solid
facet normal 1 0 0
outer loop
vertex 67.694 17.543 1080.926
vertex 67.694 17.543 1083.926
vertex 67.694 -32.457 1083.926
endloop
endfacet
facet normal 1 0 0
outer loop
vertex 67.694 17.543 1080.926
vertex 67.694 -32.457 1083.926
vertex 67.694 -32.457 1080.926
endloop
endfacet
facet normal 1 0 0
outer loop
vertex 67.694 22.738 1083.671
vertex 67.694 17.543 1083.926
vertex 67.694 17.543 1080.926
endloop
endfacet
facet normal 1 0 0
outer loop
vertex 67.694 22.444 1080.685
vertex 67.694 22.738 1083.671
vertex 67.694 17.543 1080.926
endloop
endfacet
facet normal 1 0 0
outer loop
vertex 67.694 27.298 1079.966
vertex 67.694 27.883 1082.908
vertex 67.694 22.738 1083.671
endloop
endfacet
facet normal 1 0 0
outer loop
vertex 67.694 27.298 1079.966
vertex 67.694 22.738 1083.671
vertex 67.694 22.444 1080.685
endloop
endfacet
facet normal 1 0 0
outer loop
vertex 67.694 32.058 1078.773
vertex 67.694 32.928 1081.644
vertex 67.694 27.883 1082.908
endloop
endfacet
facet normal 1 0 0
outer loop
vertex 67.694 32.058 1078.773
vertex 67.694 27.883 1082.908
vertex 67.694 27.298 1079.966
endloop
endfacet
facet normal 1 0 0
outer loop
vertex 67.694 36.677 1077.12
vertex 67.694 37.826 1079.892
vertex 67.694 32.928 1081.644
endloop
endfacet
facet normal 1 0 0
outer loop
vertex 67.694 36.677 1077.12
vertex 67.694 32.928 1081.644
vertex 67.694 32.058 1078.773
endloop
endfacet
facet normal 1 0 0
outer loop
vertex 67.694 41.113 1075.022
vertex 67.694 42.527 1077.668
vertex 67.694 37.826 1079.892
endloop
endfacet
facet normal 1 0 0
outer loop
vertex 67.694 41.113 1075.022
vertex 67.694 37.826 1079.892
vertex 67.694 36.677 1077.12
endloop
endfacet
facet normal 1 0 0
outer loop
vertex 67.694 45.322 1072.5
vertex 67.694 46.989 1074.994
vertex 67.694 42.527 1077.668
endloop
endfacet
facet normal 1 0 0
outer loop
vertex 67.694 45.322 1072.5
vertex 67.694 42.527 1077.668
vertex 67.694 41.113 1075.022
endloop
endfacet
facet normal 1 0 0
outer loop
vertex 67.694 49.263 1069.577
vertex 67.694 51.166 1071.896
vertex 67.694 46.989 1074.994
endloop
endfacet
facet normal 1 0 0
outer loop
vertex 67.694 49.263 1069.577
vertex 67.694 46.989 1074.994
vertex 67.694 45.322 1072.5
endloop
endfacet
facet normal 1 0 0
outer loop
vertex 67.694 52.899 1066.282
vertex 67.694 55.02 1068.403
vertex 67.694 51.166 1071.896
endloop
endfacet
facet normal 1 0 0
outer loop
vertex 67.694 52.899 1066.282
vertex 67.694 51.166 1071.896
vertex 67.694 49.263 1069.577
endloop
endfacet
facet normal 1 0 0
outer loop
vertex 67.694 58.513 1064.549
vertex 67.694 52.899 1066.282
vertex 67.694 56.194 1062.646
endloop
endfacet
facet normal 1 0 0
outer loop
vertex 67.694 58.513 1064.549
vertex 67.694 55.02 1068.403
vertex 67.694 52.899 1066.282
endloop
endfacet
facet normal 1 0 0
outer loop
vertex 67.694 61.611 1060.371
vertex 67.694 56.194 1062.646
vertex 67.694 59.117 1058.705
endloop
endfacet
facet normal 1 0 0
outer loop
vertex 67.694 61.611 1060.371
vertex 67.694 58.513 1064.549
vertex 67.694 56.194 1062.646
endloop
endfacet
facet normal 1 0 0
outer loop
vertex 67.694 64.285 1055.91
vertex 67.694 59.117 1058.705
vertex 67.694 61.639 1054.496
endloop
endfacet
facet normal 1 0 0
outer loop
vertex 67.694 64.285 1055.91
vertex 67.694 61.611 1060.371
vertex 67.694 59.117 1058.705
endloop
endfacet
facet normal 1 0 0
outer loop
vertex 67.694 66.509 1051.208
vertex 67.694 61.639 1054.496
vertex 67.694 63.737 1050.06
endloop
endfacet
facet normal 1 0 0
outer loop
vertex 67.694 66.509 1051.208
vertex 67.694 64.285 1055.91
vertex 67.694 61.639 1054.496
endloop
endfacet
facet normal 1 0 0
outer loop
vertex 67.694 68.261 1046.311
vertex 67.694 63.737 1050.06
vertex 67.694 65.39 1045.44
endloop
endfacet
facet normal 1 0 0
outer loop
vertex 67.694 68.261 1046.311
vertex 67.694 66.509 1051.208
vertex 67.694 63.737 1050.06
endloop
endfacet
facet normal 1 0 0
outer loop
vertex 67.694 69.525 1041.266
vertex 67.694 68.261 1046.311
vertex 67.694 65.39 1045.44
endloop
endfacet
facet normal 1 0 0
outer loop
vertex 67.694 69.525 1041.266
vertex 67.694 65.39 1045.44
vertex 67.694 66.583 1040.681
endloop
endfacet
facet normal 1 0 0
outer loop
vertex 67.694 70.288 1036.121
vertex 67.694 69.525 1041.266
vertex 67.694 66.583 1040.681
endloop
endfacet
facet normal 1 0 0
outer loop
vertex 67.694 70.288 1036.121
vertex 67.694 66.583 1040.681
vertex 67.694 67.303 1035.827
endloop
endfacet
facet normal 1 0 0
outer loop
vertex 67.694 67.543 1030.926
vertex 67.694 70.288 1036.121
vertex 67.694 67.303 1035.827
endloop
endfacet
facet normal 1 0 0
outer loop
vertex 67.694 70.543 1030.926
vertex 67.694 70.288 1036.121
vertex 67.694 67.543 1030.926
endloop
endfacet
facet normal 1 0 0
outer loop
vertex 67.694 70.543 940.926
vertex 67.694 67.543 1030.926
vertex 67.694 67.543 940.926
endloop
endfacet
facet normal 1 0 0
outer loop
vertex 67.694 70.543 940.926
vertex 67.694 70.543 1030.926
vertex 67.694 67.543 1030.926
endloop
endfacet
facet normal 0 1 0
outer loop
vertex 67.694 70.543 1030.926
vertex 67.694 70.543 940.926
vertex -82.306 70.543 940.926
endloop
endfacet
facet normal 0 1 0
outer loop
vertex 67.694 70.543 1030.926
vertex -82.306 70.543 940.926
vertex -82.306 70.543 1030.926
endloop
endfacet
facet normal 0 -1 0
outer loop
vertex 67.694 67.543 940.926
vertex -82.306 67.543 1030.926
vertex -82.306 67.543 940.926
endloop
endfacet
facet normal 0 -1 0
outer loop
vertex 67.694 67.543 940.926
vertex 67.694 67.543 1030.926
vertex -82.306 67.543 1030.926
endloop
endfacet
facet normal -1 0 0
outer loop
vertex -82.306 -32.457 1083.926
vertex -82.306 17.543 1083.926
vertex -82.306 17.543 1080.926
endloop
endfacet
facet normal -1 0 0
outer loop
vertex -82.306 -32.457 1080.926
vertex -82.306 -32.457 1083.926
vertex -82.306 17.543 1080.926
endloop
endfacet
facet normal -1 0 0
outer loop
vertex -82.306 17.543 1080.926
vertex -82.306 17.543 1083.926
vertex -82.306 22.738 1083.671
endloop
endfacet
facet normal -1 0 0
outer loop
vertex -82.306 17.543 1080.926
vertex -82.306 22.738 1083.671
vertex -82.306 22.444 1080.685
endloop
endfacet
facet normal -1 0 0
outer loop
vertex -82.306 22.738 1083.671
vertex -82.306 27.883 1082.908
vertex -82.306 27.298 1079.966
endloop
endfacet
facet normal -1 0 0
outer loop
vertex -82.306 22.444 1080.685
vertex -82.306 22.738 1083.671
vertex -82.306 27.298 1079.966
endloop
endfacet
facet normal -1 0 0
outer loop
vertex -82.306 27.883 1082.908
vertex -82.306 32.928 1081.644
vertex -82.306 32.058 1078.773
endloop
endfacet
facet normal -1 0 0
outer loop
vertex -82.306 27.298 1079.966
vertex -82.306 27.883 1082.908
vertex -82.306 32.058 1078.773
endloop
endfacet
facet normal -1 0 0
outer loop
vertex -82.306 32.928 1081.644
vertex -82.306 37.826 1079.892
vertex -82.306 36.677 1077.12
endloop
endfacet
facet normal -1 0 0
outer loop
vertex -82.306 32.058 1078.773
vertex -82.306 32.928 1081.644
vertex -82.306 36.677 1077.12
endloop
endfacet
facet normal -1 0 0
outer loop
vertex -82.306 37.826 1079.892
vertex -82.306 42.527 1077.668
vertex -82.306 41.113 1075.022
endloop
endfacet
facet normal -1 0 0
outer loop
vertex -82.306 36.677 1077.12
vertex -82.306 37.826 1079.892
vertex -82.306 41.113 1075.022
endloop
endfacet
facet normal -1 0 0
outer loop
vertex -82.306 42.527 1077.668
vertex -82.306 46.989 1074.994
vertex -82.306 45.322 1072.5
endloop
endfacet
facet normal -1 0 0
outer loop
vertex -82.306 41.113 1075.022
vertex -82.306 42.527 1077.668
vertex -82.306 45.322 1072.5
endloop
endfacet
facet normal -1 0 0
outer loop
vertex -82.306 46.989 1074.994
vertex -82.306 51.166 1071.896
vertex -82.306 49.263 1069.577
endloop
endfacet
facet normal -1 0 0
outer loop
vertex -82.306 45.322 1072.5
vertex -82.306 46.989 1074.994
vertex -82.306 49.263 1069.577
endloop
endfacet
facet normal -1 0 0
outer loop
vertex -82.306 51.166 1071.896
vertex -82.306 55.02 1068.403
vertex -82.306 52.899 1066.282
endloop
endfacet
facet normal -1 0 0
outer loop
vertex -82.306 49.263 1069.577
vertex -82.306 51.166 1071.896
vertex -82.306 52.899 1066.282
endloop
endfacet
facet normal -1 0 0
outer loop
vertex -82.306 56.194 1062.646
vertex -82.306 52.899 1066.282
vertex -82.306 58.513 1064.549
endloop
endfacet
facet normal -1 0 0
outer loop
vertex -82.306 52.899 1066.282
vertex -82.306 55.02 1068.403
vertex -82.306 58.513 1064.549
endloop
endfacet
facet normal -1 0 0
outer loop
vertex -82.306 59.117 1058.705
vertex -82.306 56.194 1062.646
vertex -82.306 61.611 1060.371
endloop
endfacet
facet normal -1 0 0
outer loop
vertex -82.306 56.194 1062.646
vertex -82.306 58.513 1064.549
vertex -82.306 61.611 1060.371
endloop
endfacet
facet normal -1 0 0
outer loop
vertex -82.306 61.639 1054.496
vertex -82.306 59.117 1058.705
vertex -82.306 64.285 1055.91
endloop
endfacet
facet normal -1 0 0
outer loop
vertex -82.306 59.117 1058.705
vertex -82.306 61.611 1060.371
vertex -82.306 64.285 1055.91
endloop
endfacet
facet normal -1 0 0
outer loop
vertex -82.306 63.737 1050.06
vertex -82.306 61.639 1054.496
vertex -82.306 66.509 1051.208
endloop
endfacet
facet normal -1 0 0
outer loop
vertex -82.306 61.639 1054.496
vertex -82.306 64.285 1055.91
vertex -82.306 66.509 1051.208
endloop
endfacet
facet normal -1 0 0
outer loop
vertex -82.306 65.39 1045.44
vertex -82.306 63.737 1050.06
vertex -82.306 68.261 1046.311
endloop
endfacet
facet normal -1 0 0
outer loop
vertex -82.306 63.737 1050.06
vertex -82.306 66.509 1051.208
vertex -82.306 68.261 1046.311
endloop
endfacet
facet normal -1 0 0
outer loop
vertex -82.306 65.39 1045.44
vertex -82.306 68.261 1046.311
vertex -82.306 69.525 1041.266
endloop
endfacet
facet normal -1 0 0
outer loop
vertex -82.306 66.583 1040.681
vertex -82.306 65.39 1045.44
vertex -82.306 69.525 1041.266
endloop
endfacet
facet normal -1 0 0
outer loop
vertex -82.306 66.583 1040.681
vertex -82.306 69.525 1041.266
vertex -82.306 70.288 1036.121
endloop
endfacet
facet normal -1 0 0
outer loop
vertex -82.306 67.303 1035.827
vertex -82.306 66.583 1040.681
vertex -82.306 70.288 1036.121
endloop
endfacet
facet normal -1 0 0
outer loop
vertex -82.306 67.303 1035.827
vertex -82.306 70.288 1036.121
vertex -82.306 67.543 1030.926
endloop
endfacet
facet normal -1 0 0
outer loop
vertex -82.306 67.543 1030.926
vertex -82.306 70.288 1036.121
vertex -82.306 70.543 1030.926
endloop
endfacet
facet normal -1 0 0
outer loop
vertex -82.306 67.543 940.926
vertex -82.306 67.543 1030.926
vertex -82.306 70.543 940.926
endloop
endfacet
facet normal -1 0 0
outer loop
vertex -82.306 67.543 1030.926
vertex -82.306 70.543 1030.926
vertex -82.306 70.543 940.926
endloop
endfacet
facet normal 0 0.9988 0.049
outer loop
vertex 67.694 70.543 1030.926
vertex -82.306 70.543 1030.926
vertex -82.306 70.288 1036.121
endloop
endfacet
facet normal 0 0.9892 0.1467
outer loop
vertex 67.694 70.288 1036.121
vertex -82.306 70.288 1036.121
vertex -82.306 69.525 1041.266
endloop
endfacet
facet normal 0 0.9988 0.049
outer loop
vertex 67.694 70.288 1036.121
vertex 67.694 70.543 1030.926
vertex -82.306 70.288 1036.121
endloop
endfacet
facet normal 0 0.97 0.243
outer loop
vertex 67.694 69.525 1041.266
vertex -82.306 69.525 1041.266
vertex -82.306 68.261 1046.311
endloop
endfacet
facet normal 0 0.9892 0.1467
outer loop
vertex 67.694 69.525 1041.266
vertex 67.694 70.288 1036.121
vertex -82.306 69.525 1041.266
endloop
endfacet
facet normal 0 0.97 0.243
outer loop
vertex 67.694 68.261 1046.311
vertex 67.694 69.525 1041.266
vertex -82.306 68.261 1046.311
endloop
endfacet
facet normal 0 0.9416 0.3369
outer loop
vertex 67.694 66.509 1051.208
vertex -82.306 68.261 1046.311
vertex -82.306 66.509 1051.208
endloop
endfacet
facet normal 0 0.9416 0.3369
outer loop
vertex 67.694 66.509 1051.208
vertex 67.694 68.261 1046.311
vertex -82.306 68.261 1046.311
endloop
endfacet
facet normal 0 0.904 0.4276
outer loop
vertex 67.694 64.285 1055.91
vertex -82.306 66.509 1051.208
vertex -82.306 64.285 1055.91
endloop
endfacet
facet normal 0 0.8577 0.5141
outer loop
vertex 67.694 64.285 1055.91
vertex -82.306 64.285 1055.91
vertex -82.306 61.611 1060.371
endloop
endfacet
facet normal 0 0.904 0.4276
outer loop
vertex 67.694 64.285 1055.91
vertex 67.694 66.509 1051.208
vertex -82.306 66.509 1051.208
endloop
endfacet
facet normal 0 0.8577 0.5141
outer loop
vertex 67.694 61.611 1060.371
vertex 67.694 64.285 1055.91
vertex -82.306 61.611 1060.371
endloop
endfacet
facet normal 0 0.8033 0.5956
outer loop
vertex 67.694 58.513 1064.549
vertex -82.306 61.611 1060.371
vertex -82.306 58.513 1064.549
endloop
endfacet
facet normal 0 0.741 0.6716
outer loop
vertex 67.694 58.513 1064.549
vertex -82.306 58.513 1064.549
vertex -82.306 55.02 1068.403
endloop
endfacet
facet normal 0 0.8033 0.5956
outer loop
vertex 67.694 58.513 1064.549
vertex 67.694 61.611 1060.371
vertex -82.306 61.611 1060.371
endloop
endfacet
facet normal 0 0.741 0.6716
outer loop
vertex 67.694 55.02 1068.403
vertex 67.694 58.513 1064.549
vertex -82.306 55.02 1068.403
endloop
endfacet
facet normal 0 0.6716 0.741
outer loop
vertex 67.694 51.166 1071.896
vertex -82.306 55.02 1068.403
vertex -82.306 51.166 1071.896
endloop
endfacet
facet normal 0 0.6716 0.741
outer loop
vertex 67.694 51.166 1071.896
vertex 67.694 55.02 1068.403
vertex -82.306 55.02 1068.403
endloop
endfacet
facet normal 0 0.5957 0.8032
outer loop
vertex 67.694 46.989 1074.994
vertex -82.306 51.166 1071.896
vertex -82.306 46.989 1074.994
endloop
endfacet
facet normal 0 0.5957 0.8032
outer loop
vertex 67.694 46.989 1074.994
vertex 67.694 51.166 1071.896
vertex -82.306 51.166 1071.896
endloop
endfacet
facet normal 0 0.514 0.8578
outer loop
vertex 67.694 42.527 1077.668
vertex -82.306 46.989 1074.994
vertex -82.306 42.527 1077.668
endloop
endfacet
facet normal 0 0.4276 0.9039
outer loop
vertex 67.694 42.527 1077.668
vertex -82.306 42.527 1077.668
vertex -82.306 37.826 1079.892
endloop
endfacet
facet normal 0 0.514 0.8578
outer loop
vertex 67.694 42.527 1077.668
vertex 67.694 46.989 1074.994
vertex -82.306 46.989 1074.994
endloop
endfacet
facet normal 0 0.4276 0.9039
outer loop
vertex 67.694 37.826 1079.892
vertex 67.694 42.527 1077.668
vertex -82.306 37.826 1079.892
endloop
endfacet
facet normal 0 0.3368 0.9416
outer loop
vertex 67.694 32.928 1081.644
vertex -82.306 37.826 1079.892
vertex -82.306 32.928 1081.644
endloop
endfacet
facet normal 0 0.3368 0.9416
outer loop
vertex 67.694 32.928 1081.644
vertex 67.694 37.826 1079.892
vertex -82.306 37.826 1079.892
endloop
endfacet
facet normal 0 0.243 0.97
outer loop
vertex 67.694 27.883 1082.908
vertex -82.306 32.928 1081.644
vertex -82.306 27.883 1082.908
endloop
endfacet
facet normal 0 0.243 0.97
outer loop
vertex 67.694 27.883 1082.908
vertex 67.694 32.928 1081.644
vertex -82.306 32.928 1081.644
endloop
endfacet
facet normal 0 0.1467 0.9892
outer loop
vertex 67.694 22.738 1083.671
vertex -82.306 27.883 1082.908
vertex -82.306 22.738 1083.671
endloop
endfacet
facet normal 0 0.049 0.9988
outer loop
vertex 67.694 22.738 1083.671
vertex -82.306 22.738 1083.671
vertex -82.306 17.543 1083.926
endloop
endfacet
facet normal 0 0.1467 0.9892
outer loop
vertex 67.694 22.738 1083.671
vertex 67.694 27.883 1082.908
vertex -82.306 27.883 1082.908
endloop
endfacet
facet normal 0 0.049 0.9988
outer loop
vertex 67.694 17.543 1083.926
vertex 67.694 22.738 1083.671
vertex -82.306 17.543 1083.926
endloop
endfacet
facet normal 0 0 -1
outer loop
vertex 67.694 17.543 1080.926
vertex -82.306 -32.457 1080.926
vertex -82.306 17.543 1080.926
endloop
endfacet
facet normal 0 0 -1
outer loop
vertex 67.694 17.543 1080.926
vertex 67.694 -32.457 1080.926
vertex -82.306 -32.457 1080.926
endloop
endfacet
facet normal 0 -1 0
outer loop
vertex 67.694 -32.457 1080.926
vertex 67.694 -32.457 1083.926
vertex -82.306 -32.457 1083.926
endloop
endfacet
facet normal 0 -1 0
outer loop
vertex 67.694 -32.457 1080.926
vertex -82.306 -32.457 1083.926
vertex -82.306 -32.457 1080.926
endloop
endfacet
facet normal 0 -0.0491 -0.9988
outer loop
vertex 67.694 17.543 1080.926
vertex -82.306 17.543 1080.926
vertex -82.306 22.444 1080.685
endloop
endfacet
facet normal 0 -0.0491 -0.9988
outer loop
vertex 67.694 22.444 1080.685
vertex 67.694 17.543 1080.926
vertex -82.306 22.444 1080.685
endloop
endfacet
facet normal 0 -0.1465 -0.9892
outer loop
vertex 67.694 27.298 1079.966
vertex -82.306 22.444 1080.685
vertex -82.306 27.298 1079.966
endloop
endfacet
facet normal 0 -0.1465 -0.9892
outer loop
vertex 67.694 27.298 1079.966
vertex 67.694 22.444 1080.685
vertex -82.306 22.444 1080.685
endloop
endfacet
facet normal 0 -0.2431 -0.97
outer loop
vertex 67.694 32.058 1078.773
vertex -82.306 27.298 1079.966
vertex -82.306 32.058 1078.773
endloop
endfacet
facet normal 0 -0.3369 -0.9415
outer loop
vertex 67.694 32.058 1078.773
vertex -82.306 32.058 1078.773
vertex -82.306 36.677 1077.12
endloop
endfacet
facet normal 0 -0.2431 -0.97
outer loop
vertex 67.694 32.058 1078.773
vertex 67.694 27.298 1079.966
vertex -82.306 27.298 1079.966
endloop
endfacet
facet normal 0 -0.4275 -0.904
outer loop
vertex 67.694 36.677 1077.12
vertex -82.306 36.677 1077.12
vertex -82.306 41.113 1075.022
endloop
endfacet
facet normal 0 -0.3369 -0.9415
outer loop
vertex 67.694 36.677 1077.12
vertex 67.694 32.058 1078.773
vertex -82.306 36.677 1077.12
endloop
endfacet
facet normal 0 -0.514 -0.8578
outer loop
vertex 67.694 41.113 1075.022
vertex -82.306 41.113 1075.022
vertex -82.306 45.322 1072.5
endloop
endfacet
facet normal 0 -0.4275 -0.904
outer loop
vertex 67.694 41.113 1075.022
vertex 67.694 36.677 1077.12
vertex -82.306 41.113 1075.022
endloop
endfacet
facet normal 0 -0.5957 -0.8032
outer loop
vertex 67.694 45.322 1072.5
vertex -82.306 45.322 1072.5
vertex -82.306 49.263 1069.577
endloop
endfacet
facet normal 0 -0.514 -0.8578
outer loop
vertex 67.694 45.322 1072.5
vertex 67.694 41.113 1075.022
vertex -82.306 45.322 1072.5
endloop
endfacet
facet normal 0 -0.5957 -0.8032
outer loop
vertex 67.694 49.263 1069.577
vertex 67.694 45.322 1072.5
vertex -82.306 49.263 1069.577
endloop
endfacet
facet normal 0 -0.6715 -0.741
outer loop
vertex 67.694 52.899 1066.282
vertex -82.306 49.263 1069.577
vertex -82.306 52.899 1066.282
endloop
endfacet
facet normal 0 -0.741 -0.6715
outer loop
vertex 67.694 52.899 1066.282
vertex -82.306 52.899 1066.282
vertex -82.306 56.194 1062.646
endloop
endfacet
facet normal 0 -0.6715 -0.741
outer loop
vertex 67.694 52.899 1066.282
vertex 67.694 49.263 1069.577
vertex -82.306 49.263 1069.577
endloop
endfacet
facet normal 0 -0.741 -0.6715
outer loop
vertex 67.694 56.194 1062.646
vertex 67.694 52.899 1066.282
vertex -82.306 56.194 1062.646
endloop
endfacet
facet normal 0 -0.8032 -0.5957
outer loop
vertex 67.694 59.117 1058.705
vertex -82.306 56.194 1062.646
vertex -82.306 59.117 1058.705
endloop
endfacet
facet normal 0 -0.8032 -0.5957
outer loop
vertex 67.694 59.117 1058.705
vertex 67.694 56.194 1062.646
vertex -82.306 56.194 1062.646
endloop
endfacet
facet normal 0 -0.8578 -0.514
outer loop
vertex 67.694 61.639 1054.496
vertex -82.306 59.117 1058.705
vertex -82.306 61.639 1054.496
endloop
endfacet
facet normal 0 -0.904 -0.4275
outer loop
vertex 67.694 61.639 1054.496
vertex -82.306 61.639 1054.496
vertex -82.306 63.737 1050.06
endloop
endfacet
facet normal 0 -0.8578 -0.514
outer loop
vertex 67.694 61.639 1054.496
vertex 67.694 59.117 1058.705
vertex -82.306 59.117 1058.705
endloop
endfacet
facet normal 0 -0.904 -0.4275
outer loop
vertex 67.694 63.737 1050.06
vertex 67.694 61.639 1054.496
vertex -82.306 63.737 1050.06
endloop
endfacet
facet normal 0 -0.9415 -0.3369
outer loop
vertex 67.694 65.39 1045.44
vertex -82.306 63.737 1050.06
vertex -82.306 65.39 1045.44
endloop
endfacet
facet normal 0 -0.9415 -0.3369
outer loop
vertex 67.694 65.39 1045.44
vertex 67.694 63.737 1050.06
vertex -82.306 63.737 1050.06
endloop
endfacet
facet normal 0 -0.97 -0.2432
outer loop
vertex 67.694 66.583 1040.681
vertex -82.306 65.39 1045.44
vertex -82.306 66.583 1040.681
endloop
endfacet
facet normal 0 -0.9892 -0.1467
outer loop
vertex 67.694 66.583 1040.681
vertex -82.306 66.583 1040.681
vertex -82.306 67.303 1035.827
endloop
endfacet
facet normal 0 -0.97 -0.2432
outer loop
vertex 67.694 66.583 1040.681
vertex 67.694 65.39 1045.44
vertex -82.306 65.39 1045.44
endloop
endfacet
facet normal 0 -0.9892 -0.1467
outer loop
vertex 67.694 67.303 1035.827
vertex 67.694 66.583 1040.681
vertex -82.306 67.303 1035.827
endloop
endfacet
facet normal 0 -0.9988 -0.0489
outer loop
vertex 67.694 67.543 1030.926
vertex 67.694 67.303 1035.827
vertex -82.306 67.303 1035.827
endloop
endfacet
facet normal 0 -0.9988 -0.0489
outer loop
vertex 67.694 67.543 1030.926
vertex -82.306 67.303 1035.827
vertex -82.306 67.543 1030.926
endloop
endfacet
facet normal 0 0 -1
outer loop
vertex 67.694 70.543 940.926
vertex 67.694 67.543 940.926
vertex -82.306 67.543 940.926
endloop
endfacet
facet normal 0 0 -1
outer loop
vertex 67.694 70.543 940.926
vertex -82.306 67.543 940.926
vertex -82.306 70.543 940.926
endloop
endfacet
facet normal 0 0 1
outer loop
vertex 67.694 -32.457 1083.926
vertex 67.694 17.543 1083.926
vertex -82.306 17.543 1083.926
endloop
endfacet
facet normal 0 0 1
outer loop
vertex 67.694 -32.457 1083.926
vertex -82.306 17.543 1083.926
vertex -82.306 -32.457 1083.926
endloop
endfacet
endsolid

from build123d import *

# Parameters (mm, degrees)
SALIENTE_EXTRUIR1_DEPTH = 75


with BuildPart() as part:
    # Croquis1 → Saliente-Extruir1 (new, symmetric)
    with BuildSketch(Plane(origin=(-7.305693887, -32.456719669, 940.926254751), x_dir=(0, 0, -1), z_dir=(1, 0, 0))):
        with BuildLine():
            Line((-90, 100), (0, 100))
            Line((0, 100), (0, 103))
            Line((0, 103), (-90, 103))
            ThreePointArc((-90, 103), (-127.476659403, 87.476659403), (-143, 50))
            Line((-143, 50), (-143, 0))
            Line((-143, 0), (-140, 0))
            Line((-140, 0), (-140, 50))
            ThreePointArc((-140, 50), (-125.355339059, 85.355339059), (-90, 100))
        make_face()
    extrude(amount=SALIENTE_EXTRUIR1_DEPTH, both=True)


solid = part.part
